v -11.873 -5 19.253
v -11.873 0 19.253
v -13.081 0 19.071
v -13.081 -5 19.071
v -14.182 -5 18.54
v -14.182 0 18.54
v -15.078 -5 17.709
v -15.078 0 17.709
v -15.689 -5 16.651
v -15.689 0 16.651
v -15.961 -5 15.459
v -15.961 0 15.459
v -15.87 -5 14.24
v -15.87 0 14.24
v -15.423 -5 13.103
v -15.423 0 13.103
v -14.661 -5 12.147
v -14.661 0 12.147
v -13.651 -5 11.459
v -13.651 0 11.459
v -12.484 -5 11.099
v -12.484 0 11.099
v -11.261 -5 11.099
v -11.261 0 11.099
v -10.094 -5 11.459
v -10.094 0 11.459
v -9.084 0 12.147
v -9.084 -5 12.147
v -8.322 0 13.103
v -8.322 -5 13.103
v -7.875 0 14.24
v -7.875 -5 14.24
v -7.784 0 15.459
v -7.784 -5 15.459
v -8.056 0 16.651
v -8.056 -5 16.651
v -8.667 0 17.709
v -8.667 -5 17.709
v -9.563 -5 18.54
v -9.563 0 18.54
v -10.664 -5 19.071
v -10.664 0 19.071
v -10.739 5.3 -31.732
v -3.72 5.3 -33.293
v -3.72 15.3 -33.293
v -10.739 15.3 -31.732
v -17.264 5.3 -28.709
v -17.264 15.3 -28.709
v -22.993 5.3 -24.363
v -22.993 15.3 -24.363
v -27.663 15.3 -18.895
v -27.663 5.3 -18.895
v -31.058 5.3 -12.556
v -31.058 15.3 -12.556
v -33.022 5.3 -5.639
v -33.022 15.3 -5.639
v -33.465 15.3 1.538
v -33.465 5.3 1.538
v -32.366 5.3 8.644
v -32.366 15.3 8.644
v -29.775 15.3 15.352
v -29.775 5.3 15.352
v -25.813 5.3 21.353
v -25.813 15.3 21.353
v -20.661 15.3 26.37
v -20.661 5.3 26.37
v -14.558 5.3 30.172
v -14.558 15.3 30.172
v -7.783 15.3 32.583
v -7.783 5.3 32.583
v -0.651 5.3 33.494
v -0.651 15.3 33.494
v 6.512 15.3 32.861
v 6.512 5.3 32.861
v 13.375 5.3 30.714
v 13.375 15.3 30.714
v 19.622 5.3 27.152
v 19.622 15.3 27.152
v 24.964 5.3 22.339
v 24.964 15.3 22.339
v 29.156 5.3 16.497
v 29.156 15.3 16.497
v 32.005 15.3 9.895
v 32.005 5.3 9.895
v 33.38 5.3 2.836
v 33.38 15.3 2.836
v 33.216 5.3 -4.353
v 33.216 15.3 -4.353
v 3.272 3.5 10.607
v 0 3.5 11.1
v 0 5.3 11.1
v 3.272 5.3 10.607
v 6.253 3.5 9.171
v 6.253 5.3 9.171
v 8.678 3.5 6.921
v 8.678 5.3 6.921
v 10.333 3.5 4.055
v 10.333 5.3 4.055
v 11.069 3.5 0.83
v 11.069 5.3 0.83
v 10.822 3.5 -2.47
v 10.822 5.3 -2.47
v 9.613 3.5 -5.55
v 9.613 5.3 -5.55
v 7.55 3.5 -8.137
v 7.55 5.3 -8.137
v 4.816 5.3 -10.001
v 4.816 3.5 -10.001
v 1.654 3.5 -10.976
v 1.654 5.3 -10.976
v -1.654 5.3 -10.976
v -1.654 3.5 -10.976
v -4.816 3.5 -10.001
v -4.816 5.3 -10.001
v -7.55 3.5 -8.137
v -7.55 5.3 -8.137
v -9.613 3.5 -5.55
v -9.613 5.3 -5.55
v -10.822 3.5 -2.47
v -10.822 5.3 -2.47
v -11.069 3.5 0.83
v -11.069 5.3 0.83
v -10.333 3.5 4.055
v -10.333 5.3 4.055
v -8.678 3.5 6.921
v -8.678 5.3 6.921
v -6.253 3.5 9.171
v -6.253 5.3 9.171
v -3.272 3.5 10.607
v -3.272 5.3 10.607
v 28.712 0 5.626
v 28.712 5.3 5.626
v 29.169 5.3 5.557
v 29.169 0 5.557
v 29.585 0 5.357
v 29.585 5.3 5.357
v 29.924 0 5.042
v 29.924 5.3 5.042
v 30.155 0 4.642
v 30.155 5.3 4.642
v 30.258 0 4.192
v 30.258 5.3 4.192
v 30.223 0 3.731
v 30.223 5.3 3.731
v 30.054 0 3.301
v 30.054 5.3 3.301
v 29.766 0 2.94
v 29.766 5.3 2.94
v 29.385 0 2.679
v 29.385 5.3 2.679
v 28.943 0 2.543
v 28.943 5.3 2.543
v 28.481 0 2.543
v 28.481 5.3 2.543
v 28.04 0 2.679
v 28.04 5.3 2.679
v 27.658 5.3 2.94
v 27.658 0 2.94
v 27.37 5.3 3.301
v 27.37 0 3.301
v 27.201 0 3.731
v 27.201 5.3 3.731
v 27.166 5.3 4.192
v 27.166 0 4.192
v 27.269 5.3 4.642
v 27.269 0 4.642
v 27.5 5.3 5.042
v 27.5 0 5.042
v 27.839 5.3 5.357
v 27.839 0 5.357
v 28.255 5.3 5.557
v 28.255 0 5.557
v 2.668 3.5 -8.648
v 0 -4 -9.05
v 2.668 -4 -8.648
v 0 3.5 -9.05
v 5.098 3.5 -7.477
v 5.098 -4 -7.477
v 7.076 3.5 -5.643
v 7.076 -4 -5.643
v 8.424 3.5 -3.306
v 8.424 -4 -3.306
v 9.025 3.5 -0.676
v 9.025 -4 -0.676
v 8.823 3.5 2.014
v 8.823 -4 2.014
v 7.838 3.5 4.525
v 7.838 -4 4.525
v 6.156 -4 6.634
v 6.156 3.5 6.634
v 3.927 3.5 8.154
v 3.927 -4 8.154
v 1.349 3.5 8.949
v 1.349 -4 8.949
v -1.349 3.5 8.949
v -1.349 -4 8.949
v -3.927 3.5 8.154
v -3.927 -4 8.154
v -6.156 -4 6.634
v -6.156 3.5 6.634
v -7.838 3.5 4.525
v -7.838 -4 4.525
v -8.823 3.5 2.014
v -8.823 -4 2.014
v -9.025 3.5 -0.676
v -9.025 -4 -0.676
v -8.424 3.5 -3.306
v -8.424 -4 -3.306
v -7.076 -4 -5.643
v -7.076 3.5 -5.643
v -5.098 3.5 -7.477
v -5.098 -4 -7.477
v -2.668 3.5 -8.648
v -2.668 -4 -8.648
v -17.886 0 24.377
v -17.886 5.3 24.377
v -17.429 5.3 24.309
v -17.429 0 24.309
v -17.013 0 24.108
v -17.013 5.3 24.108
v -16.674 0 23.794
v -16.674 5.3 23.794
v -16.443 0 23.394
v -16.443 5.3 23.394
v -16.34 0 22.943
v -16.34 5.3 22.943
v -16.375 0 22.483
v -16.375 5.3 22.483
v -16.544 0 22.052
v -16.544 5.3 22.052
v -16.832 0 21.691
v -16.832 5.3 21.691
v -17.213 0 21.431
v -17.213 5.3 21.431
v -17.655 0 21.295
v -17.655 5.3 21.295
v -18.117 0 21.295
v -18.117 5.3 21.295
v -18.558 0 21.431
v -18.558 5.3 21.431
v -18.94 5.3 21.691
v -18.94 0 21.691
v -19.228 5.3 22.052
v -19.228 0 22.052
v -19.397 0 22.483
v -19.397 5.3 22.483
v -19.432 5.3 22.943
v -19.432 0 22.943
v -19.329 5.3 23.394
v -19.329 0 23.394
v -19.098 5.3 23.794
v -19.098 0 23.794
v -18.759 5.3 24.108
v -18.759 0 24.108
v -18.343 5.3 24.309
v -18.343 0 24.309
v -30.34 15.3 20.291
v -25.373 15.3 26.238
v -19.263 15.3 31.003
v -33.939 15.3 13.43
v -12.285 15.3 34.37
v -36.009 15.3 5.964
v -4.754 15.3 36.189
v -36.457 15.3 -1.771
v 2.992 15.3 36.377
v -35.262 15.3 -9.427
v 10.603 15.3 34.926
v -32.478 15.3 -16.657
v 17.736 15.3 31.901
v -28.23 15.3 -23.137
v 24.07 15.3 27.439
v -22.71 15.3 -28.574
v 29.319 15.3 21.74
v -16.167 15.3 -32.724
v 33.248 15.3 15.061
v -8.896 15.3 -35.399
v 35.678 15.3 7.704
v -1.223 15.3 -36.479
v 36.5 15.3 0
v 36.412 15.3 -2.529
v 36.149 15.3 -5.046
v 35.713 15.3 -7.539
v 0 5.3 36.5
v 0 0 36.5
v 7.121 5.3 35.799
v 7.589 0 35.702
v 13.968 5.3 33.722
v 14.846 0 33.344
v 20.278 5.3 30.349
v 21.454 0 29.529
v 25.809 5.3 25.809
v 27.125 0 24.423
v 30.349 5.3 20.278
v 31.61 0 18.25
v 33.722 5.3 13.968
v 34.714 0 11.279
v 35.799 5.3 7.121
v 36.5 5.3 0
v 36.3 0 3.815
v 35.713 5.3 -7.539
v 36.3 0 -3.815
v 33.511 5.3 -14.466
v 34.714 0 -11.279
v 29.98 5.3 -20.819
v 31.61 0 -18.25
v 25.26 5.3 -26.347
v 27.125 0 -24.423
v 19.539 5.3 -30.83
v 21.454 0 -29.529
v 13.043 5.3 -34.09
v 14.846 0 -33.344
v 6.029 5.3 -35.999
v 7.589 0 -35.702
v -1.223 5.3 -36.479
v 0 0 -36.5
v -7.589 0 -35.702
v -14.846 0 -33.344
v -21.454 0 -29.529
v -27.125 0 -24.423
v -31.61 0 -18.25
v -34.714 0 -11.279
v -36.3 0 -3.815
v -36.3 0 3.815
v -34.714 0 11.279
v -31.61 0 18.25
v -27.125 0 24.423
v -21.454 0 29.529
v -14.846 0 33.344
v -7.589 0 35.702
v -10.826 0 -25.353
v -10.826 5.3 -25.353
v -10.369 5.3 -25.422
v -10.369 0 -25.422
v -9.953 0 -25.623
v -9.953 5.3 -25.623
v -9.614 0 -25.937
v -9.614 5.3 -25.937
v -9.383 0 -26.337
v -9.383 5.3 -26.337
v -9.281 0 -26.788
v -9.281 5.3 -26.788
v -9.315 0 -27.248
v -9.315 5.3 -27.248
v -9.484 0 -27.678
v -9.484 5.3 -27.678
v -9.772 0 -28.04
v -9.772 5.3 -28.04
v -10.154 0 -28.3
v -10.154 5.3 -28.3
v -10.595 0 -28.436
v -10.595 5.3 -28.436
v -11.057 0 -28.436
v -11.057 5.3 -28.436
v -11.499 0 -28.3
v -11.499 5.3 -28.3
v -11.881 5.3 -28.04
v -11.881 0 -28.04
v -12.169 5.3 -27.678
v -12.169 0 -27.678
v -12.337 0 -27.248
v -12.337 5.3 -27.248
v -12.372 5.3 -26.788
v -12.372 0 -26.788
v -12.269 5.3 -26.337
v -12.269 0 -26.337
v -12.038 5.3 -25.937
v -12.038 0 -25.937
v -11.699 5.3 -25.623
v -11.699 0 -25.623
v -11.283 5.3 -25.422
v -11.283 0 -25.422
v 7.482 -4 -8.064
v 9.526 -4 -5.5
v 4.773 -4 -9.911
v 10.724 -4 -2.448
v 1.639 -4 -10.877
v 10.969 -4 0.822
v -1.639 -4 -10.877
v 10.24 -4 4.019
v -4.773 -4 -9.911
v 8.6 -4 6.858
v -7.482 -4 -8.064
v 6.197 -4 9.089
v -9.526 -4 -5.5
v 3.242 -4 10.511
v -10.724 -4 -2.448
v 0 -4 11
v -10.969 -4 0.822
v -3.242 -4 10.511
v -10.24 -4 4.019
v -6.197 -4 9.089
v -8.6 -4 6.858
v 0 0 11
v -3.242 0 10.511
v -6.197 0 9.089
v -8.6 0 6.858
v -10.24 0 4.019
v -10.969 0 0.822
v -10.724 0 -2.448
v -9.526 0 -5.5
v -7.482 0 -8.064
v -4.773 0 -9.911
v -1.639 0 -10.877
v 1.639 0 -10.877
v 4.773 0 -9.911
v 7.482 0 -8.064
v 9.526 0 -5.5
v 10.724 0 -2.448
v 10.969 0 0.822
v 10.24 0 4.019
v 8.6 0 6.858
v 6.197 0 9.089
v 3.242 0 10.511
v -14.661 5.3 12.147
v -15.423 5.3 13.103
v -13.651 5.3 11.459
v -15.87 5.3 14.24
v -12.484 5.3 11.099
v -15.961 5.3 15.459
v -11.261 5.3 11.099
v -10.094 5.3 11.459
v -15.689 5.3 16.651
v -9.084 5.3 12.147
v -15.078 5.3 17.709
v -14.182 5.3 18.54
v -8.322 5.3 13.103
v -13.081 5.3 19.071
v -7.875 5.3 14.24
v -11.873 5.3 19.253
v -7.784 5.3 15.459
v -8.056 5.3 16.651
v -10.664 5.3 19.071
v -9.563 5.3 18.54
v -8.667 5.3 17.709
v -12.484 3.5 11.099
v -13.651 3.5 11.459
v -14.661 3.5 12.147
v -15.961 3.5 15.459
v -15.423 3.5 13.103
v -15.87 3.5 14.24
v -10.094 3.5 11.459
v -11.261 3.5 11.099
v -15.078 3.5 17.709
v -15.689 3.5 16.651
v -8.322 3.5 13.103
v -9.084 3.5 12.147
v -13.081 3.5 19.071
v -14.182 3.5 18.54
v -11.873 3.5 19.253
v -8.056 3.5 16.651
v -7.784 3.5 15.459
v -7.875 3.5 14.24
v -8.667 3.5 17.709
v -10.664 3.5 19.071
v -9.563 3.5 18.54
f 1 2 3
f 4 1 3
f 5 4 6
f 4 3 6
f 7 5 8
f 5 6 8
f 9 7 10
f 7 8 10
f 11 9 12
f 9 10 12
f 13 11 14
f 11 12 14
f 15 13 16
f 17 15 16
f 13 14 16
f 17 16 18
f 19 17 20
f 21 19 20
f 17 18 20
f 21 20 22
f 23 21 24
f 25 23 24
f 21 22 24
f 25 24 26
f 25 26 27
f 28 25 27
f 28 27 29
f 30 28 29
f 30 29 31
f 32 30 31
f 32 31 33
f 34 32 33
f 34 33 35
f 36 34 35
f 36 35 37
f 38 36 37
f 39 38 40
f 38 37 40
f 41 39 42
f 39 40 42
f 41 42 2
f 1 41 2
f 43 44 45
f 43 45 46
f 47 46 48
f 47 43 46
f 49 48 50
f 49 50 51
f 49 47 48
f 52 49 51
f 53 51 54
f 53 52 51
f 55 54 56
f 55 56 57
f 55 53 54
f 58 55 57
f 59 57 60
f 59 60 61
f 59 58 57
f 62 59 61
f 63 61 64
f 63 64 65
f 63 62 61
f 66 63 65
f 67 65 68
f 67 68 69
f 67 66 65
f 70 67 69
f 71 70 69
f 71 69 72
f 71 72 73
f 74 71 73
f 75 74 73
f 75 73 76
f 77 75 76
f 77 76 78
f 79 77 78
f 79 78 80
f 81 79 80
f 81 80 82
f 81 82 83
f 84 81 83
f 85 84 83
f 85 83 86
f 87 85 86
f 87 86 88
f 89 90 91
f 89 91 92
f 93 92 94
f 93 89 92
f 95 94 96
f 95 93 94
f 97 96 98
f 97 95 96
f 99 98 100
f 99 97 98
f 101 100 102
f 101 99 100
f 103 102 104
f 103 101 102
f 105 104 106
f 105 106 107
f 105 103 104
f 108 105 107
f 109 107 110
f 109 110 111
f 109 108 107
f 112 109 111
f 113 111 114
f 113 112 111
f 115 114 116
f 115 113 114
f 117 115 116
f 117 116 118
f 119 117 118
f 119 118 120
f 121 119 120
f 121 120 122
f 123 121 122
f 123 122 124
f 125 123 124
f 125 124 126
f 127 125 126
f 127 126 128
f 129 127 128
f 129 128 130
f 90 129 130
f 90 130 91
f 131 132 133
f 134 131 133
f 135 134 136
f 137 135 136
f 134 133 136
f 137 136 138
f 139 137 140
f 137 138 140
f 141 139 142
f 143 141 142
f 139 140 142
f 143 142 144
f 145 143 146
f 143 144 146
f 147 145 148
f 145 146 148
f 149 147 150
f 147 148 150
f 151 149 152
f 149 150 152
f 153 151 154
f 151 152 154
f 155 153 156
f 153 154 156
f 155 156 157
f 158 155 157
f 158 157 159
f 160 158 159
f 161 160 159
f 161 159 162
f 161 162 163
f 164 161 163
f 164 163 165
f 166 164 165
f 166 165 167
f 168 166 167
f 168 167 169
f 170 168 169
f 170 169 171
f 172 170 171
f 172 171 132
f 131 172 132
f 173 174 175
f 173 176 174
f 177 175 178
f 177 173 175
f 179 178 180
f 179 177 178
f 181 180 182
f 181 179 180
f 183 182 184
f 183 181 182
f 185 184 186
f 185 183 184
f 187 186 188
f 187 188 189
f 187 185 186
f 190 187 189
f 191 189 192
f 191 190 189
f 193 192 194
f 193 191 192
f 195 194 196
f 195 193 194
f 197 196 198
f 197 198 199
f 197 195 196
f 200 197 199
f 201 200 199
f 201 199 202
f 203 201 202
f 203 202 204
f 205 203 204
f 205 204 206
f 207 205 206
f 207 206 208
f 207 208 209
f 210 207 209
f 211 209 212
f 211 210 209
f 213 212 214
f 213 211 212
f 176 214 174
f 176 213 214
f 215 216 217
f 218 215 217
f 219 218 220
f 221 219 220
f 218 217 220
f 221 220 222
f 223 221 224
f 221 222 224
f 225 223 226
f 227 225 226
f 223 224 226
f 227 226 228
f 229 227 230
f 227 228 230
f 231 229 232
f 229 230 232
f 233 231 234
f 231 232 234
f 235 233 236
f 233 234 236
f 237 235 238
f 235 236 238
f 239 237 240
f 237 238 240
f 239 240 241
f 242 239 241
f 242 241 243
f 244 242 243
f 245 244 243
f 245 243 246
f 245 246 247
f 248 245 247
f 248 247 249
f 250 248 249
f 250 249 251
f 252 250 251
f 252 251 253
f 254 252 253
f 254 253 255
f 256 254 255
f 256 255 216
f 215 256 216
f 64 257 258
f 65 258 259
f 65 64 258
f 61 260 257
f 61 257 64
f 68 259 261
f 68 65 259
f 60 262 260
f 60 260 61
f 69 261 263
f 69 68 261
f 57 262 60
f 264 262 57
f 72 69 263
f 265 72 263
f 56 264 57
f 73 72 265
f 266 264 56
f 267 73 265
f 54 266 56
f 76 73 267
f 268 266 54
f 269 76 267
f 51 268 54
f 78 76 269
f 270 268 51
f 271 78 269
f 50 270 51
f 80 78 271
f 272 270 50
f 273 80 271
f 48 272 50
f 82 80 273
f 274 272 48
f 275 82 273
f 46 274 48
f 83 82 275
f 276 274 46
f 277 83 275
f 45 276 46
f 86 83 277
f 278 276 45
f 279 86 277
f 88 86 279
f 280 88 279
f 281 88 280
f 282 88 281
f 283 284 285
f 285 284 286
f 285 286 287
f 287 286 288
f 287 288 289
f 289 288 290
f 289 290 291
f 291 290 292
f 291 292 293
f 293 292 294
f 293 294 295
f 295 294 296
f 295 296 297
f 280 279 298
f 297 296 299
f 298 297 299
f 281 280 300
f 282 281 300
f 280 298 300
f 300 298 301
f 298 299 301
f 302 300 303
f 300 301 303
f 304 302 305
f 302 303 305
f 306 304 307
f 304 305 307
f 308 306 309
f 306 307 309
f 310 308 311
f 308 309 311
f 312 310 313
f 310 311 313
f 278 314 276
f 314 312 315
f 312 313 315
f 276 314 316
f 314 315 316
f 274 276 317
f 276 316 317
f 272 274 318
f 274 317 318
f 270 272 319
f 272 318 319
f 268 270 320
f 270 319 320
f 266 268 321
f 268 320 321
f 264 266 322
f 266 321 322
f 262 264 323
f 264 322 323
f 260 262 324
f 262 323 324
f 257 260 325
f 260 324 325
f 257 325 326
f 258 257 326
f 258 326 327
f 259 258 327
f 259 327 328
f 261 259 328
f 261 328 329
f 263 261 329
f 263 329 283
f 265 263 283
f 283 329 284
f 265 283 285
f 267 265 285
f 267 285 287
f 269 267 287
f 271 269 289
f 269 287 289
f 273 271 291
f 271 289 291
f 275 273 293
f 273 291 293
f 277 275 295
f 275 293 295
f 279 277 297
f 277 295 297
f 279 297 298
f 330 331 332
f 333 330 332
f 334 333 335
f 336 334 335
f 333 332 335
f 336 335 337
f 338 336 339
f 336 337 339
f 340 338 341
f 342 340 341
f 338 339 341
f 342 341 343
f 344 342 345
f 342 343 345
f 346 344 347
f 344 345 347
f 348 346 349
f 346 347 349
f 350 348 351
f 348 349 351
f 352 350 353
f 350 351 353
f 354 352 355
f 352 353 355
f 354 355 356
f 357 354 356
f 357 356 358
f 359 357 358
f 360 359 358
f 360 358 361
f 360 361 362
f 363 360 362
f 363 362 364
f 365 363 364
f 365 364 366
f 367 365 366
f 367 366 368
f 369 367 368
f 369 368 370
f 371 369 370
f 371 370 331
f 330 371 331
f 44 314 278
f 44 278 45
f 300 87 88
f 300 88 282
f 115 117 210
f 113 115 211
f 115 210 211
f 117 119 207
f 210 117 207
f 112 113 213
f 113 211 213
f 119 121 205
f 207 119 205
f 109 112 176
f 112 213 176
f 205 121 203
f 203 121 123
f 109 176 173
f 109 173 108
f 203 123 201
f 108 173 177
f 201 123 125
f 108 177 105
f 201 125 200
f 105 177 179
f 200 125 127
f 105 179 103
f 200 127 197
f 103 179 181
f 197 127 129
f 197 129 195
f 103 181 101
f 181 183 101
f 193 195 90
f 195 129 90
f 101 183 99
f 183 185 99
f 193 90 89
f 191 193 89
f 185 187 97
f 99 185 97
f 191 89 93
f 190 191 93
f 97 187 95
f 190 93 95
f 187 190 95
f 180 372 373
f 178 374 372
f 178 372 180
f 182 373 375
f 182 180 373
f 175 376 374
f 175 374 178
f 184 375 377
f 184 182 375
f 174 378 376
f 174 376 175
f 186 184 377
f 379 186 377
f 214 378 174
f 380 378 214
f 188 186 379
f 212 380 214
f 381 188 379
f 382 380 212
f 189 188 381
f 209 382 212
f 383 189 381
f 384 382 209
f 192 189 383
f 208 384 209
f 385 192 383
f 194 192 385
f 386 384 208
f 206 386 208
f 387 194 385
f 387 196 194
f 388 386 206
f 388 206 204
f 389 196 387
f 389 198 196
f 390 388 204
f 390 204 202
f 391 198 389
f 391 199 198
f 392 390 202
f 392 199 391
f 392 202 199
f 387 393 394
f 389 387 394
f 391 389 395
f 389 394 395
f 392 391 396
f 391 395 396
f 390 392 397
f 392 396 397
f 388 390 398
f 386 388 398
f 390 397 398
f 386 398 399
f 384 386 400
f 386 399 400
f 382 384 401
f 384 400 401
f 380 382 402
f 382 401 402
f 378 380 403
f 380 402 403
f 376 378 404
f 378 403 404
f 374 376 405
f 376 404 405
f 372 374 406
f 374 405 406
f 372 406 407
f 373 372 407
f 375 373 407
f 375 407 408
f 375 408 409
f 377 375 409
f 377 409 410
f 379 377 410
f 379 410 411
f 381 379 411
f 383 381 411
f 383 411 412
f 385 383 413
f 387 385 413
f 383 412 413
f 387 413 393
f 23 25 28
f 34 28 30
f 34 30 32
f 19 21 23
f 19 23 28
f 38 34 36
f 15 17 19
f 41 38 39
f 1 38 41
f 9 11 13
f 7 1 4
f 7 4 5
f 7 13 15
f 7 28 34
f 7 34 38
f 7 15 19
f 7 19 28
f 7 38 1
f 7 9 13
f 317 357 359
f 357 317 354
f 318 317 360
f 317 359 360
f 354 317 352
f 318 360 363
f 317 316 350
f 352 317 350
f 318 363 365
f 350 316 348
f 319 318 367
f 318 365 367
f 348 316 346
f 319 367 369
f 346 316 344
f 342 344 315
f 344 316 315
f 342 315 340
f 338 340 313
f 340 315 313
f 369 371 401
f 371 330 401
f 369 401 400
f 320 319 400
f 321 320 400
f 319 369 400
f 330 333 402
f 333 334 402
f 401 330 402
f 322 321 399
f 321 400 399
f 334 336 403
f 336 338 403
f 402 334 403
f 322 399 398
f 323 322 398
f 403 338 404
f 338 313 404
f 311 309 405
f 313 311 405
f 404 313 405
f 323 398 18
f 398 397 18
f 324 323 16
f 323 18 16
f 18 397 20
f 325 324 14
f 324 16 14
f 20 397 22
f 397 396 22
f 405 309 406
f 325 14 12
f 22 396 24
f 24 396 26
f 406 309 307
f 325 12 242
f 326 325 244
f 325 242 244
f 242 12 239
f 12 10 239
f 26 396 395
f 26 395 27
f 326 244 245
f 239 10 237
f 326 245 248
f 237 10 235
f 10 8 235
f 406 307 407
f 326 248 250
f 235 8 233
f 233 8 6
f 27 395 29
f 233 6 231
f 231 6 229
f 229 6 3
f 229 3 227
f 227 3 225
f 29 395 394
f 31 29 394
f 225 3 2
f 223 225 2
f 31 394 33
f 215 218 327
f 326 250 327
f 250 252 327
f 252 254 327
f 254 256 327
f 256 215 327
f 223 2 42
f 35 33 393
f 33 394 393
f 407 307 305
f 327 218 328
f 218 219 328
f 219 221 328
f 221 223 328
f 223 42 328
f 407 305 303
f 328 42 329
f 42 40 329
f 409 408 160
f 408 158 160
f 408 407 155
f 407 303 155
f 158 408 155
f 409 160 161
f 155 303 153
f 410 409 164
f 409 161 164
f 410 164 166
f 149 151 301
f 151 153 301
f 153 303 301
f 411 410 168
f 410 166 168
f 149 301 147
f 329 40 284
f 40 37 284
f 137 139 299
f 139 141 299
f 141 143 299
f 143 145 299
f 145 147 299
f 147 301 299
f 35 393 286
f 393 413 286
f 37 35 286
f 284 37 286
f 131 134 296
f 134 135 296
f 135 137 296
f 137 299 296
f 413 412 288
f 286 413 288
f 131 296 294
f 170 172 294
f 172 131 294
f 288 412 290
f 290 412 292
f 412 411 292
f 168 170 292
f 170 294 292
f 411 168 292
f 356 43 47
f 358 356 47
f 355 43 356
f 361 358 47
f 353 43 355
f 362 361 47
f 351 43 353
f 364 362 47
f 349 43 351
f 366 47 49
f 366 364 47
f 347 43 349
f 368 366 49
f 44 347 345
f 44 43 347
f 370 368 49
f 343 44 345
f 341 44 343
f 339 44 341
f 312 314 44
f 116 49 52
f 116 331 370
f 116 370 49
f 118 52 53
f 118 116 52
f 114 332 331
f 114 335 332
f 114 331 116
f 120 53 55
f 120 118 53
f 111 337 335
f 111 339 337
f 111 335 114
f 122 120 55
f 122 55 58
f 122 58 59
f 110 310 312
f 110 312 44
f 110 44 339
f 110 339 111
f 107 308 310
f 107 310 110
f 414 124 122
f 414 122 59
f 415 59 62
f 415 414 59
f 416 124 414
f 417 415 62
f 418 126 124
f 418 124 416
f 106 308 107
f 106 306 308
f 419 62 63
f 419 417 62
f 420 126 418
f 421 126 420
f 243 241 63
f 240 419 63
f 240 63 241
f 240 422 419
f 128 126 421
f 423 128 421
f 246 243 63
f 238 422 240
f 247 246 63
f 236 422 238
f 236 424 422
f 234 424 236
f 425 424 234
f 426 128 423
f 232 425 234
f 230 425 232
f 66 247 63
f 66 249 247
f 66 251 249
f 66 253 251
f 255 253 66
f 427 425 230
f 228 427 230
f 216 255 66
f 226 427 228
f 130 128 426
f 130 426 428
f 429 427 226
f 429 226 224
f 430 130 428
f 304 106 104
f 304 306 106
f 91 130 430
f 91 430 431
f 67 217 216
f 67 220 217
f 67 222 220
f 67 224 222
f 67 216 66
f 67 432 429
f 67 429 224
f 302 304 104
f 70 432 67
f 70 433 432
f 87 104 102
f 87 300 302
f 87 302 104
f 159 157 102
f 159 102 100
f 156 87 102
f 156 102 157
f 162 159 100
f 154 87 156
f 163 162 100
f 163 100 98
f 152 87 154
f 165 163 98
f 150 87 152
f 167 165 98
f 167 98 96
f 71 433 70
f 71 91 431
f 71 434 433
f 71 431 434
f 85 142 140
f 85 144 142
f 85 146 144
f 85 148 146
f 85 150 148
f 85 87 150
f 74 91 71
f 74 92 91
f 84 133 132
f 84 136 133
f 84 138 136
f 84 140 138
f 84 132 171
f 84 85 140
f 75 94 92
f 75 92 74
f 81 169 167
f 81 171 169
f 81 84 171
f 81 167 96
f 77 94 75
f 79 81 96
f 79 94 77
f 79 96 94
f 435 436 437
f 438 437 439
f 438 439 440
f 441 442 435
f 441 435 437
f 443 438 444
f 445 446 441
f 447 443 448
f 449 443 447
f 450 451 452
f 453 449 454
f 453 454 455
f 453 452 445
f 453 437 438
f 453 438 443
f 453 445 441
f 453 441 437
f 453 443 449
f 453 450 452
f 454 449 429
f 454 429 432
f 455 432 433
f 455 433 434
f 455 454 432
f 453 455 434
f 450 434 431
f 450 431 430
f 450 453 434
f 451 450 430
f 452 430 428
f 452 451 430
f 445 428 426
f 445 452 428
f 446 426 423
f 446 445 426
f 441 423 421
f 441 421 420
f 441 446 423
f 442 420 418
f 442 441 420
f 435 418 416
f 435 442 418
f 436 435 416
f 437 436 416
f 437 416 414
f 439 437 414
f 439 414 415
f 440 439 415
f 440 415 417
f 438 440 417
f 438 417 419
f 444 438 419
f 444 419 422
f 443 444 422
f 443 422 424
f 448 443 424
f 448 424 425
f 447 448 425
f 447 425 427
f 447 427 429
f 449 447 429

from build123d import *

# Parameters (mm, degrees)
SKETCH_1_R          = 36.5
EXTRUDE_1_DEPTH     = 5.3
SKETCH_2_R          = 36.5
SKETCH_2_R_2        = 33.5
EXTRUDE_1_2_DEPTH   = 10
SKETCH_4_R          = 4.1
EXTRUDE_3_DEPTH     = 5
SKETCH_5_R          = 4.1
EXTRUDE_4_DEPTH     = 3.5
CUT_EXTRUDE_1_DEPTH = 10
SKETCH_8_R          = 12
EXTRUDE_7_DEPTH     = 3.5
SKETCH_9_R          = 11
SKETCH_9_R_2        = 9.05
EXTRUDE_8_DEPTH     = 4
CUT_EXTRUDE_START   = -10
SKETCH_10_R         = 9.05
CUT_EXTRUDE_2_DEPTH = 10
SKETCH_11_R         = 1.55
CUT_EXTRUDE_3_DEPTH = 53.636394253


with BuildPart() as part:
    # 草图1 → Extrude 1 (new body)
    with BuildSketch(Plane(origin=(0, 0, 0), x_dir=(1, 0, 0), z_dir=(0, 1, 0))):
        Circle(SKETCH_1_R)
        with BuildLine():
            ThreePointArc((-7.772537517, -15.152734173), (-15.558840193, -16.947496714), (-9.343841215, -11.925398583))
            ThreePointArc((-9.343841215, -11.925398583), (-8.186234841, -13.357971631), (-7.772537517, -15.152734173))
        make_face(mode=Mode.SUBTRACT)
        with BuildLine():
            ThreePointArc((11.1, 0), (4.858991271, -9.979990172), (-6.845982672, -8.737420744))
            ThreePointArc((-6.845982672, -8.737420744), (-4.858991271, 9.979990172), (11.1, 0))
        make_face(mode=Mode.SUBTRACT)
    extrude(amount=EXTRUDE_1_DEPTH)

    # 草图2 → Extrude 1 2 (add)
    with BuildSketch(Plane(origin=(0, 5.3, 0), x_dir=(1, 0, 0), z_dir=(0, 1, 0))):
        Circle(SKETCH_2_R)
        Circle(SKETCH_2_R_2, mode=Mode.SUBTRACT)
    extrude(amount=EXTRUDE_1_2_DEPTH)



with BuildPart() as body_2:
    # 草图4 → 凸台-拉伸3 (new body)
    with BuildSketch(Plane.XZ):
        with Locations((-11.872537517, 15.152734173)):
            Circle(SKETCH_4_R)
    extrude(amount=EXTRUDE_3_DEPTH)


with BuildPart() as part_1:
    add(part.part)

    add(body_2.part)  # 凸台-拉伸4 merges body 2
    # 草图5 → 凸台-拉伸4 (add)
    with BuildSketch(Plane(origin=(0, 0, 0), x_dir=(1, 0, 0), z_dir=(0, 1, 0))):
        with Locations((-11.872537517, -15.152734173)):
            Circle(SKETCH_5_R)
    extrude(amount=EXTRUDE_4_DEPTH)

    # 草图6 → 切除-拉伸1 (cut)
    with BuildSketch(Plane(origin=(0, 5.3, 0), x_dir=(1, 0, 0), z_dir=(0, 1, 0))):
        Polygon((0, 0), (30.542099638, 6.447606501), (33.216045924, 4.352504242), (44.964219504, 19.346514664), (8.028154367, 48.286824318), (-3.720019212, 33.292813895), (-1.046072926, 31.197711636), align=None)
    extrude(amount=CUT_EXTRUDE_1_DEPTH, mode=Mode.SUBTRACT)

    # 草图8 → 凸台-拉伸7 (add)
    with BuildSketch(Plane.XZ):
        Circle(SKETCH_8_R)
    extrude(amount=-EXTRUDE_7_DEPTH)

    # 草图9 → 凸台-拉伸8 (add)
    with BuildSketch(Plane.XZ):
        Circle(SKETCH_9_R)
        Circle(SKETCH_9_R_2, mode=Mode.SUBTRACT)
    extrude(amount=EXTRUDE_8_DEPTH)

    # 草图10 → 切除-拉伸2 (cut)
    with BuildSketch(Plane.XZ.offset(4).offset(CUT_EXTRUDE_START)):
        Circle(SKETCH_10_R)
    extrude(amount=CUT_EXTRUDE_2_DEPTH, mode=Mode.SUBTRACT)

    # 草图11 → 切除-拉伸3 (cut, through all)
    with BuildSketch(Plane(origin=(0, 5.3, 0), x_dir=(1, 0, 0), z_dir=(0, 1, 0))):
        with Locations((-17.885900675, -22.827495637)):
            Circle(SKETCH_11_R)
        with Locations((-10.826240789, 26.903392172)):
            Circle(SKETCH_11_R)
        with Locations((28.712141464, -4.075896535)):
            Circle(SKETCH_11_R)
    extrude(amount=-CUT_EXTRUDE_3_DEPTH, mode=Mode.SUBTRACT)


solid = part_1.part
